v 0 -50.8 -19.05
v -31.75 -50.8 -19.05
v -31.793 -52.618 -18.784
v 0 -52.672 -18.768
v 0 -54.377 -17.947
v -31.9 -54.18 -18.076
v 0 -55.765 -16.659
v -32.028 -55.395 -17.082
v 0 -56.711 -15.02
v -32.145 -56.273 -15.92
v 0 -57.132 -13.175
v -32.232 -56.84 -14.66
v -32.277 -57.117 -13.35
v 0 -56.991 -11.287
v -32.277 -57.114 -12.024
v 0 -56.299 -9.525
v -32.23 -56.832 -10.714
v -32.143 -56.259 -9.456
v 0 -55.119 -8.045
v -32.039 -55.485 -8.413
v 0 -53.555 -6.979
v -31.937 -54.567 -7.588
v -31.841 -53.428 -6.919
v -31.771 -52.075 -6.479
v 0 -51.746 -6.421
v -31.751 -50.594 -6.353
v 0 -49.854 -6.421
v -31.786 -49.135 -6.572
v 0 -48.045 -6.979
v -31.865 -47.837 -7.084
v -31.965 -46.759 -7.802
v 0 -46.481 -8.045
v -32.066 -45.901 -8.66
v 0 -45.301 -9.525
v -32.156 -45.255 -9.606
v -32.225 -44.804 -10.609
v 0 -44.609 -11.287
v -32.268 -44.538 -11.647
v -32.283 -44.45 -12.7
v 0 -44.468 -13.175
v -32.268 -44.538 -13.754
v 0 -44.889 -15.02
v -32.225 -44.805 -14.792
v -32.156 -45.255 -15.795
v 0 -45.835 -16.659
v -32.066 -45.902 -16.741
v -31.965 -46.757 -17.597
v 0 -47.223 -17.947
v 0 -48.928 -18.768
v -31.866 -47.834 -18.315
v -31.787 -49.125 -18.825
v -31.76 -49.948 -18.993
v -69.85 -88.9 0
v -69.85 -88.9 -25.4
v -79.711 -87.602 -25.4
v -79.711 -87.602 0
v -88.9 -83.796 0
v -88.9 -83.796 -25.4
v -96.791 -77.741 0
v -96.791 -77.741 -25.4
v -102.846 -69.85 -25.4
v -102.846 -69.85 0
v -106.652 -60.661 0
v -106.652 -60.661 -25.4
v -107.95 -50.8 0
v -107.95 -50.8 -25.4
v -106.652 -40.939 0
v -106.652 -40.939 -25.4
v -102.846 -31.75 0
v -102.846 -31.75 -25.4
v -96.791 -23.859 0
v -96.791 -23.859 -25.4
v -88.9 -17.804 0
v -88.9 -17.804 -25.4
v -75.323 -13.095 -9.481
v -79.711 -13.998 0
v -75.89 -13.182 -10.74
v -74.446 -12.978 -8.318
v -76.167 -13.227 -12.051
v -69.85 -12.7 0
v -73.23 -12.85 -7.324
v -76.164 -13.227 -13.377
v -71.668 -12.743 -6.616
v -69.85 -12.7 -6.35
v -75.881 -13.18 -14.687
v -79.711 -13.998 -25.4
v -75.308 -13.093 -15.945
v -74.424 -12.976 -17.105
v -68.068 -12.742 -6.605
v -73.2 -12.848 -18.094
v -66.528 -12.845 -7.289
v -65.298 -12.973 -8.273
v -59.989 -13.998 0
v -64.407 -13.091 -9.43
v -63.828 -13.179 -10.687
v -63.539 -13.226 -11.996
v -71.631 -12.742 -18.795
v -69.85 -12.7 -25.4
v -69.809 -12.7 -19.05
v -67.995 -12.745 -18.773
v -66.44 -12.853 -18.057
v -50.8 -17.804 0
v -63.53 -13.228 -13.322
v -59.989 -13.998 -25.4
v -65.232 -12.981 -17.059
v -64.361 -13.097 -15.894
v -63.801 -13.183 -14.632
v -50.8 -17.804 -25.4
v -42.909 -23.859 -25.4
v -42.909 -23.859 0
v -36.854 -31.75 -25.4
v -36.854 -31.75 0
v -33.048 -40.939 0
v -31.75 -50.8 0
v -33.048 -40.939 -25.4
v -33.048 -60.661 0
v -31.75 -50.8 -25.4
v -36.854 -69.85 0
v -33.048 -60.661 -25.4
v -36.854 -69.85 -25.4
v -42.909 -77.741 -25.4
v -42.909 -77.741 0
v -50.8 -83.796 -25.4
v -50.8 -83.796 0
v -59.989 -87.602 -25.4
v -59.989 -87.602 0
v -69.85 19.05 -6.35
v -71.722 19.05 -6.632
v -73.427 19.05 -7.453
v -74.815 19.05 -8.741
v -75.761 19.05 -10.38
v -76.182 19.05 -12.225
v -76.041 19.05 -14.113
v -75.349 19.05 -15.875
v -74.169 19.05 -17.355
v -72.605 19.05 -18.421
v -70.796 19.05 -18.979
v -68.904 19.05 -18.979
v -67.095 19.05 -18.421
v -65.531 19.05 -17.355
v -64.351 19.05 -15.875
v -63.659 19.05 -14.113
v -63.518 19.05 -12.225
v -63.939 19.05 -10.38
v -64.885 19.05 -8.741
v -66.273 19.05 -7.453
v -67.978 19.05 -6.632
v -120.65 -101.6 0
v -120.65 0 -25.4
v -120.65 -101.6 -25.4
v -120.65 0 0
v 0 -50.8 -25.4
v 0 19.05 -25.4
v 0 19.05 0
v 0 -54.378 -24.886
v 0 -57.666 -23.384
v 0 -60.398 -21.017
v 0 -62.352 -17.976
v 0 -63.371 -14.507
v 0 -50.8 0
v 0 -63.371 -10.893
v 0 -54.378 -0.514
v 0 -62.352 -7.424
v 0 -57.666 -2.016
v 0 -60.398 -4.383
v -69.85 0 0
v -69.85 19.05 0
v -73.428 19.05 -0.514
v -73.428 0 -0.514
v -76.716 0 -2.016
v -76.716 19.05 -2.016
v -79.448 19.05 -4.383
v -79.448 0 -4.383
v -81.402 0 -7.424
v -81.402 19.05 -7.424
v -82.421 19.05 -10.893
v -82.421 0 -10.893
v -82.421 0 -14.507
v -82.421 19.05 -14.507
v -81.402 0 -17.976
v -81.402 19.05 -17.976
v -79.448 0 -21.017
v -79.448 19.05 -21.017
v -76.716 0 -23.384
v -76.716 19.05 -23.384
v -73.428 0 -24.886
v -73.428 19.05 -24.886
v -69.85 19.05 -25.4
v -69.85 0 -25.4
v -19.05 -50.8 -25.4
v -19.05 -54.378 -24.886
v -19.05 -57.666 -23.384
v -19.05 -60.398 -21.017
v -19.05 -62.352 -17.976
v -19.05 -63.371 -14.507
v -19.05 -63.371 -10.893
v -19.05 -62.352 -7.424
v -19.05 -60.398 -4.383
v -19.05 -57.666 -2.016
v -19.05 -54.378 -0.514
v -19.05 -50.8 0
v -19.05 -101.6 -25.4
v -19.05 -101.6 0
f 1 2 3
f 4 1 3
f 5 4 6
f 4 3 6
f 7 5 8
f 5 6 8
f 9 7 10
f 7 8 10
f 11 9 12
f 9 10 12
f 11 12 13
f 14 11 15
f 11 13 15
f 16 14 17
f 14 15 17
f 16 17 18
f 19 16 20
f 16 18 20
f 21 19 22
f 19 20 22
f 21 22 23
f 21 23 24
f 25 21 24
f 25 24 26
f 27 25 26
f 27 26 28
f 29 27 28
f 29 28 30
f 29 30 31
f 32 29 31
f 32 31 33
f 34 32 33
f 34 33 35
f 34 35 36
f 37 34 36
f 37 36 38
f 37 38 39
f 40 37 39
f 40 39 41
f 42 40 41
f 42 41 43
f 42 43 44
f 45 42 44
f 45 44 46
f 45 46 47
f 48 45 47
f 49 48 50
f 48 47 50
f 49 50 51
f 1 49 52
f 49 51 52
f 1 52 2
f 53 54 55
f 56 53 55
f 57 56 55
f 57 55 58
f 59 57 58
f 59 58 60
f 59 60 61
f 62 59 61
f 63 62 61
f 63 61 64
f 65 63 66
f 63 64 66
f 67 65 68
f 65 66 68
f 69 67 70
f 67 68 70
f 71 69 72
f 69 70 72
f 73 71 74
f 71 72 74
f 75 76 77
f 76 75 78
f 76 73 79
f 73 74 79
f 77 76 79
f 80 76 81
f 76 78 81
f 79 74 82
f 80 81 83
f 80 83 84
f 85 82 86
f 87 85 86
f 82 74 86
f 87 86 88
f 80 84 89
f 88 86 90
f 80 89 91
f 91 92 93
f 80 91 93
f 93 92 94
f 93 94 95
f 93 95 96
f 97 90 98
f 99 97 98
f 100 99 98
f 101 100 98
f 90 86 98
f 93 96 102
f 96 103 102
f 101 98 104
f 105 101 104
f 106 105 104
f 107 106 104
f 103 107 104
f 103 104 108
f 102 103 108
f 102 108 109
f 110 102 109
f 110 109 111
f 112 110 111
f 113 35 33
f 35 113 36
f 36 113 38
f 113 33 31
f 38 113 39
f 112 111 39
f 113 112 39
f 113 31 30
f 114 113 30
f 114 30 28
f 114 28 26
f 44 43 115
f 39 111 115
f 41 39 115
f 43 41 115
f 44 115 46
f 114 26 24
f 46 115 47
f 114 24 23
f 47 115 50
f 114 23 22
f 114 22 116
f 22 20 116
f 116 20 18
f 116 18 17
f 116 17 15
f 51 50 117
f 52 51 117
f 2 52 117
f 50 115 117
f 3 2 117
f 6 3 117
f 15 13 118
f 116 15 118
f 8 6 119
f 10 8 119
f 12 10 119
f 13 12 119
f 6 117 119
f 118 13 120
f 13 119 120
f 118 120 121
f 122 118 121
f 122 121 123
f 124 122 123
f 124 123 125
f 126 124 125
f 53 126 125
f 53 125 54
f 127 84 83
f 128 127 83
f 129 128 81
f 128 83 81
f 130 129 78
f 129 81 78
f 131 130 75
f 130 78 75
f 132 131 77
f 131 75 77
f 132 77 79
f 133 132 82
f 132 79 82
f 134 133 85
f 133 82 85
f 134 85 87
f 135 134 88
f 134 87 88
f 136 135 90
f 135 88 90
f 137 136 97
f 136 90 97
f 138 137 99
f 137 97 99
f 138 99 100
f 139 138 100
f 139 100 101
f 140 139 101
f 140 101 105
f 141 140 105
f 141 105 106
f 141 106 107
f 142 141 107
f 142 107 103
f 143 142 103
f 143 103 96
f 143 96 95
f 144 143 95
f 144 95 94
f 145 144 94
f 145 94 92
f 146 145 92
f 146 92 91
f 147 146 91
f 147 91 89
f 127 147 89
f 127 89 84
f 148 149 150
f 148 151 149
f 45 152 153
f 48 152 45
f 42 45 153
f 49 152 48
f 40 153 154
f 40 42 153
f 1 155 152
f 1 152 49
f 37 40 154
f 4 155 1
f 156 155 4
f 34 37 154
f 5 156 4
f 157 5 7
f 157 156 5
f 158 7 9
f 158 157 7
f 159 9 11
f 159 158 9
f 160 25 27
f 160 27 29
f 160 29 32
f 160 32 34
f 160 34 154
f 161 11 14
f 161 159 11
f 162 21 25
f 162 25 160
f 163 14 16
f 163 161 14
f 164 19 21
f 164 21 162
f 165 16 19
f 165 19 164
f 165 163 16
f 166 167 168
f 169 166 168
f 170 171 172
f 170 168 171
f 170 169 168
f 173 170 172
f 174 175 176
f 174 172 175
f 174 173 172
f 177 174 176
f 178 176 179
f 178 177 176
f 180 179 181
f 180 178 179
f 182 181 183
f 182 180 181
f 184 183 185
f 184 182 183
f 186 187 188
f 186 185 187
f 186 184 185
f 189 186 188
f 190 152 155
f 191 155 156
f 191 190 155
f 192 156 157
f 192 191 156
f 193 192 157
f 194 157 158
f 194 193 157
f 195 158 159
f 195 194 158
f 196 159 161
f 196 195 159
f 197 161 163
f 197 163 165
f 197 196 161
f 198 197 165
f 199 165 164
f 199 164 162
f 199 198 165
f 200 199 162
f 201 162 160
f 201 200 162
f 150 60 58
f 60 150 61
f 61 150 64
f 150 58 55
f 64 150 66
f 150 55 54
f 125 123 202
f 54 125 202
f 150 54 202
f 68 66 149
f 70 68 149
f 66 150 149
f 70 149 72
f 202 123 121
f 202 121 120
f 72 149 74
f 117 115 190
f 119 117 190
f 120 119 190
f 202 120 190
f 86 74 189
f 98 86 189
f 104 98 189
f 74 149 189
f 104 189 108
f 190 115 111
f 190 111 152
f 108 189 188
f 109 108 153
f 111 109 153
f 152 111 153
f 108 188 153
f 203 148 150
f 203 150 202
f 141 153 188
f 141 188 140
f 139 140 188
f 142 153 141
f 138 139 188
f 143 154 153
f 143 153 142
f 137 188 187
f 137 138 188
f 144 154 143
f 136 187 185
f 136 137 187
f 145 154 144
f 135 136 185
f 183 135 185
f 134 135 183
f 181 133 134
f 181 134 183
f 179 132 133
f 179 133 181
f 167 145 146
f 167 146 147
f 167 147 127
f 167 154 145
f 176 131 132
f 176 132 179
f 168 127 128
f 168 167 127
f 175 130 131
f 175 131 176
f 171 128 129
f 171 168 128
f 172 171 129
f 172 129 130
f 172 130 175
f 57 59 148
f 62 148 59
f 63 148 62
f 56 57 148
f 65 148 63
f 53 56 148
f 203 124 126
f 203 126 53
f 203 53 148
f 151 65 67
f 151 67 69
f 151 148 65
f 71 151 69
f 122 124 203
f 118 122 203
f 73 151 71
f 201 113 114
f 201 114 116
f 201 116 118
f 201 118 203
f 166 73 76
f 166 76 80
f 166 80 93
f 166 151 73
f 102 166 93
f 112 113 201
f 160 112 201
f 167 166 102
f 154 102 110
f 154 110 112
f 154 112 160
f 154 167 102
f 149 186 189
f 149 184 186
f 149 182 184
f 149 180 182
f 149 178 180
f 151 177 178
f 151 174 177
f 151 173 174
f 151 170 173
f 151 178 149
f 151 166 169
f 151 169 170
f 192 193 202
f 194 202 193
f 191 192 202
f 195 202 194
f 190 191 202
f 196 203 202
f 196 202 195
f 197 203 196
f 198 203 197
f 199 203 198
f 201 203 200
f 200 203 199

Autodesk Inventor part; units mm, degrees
ref_plane "YZ Plane" through (0, 0, 0) normal (1, 0, 0) x (0, 1, 0)
ref_plane "XZ Plane" through (0, 0, 0) normal (0, 1, 0) x (-1, 0, 0)
ref_plane "XY Plane" through (0, 0, 0) normal (0, 0, 1) x (1, 0, 0)
sketch "Sketch2" plane through (0, 0, 0) normal (0, 1, 0) x (-1, 0, 0)
  line L0 (0, 0) -> (69.85, 0)
  line L1 (69.85, 0) -> (69.85, -25.4) construction
  line L2 (69.85, -25.4) -> (0, -25.4)
  line L3 (0, -25.4) -> (0, 0)
  arc A0 (69.85, -25.4) -> (69.85, 0) centre (69.85, -12.7) ccw
  dimension "d0" = 25.4
  dimension "d1" = 69.85
extrude "Extrusion1" add sketch "Sketch2" along normal blind 19.05
ref_plane "Work Plane1" through (0, 19.05, 0) normal (0.7071068, -0.7071068, 0) x (0, 0, -1)
mirror "Mirror1" about plane through (0, 19.05, 0) normal (0.7071068, -0.7071068, 0) of "Extrusion1"
sketch "Sketch3" plane through (-69.85, 19.05, 0) normal (0, 0, 1) x (1, 0, 0)
  line L0 (50.8, -69.85) -> (50.8, -19.05) projected
  line L1 (-50.8, -120.65) -> (50.8, -120.65)
  line L2 (50.8, -120.65) -> (50.8, -19.05)
  line L3 (50.8, -19.05) -> (-50.8, -19.05)
  line L4 (-50.8, -19.05) -> (-50.8, -120.65)
  line L5 (-50.8, -120.65) -> (50.8, -19.05) construction
  line L6 (50.8, -120.65) -> (-50.8, -19.05) construction
  point P0 (0, -69.85)
  point P1 (0, -69.85)
  dimension "d6" = 101.6
extrude "Extrusion2" add sketch "Sketch3" against normal up to surface (25.4 mm away)
hole "Hole1" at (-69.85, -50.8, 0) direction (0, 0, -1) diameter 76.2 end through all
sketch "Sketch4" plane through (0, 19.05, 0) normal (1, 0, 0) x (0, 0, -1)
  arc A0 (0, -69.85) -> (25.4, -69.85) centre (12.7, -69.85) ccw projected
  point P0 (0, -19.05)
hole "Hole2" at (0, -50.8, -12.7) direction (-1, 0, 0) diameter 12.7 end up to surface
sketch "Sketch5" plane through (0, 19.05, 0) normal (0, 1, 0) x (1, 0, 0)
  arc A0 (-69.85, 25.4) -> (-69.85, 0) centre (-69.85, 12.7) ccw projected
  point P0 (0, 0)
hole "Hole3" at (-69.85, 19.05, -12.7) direction (0, -1, 0) diameter 12.7 end up to surface
properties part number "PivotHolder"
